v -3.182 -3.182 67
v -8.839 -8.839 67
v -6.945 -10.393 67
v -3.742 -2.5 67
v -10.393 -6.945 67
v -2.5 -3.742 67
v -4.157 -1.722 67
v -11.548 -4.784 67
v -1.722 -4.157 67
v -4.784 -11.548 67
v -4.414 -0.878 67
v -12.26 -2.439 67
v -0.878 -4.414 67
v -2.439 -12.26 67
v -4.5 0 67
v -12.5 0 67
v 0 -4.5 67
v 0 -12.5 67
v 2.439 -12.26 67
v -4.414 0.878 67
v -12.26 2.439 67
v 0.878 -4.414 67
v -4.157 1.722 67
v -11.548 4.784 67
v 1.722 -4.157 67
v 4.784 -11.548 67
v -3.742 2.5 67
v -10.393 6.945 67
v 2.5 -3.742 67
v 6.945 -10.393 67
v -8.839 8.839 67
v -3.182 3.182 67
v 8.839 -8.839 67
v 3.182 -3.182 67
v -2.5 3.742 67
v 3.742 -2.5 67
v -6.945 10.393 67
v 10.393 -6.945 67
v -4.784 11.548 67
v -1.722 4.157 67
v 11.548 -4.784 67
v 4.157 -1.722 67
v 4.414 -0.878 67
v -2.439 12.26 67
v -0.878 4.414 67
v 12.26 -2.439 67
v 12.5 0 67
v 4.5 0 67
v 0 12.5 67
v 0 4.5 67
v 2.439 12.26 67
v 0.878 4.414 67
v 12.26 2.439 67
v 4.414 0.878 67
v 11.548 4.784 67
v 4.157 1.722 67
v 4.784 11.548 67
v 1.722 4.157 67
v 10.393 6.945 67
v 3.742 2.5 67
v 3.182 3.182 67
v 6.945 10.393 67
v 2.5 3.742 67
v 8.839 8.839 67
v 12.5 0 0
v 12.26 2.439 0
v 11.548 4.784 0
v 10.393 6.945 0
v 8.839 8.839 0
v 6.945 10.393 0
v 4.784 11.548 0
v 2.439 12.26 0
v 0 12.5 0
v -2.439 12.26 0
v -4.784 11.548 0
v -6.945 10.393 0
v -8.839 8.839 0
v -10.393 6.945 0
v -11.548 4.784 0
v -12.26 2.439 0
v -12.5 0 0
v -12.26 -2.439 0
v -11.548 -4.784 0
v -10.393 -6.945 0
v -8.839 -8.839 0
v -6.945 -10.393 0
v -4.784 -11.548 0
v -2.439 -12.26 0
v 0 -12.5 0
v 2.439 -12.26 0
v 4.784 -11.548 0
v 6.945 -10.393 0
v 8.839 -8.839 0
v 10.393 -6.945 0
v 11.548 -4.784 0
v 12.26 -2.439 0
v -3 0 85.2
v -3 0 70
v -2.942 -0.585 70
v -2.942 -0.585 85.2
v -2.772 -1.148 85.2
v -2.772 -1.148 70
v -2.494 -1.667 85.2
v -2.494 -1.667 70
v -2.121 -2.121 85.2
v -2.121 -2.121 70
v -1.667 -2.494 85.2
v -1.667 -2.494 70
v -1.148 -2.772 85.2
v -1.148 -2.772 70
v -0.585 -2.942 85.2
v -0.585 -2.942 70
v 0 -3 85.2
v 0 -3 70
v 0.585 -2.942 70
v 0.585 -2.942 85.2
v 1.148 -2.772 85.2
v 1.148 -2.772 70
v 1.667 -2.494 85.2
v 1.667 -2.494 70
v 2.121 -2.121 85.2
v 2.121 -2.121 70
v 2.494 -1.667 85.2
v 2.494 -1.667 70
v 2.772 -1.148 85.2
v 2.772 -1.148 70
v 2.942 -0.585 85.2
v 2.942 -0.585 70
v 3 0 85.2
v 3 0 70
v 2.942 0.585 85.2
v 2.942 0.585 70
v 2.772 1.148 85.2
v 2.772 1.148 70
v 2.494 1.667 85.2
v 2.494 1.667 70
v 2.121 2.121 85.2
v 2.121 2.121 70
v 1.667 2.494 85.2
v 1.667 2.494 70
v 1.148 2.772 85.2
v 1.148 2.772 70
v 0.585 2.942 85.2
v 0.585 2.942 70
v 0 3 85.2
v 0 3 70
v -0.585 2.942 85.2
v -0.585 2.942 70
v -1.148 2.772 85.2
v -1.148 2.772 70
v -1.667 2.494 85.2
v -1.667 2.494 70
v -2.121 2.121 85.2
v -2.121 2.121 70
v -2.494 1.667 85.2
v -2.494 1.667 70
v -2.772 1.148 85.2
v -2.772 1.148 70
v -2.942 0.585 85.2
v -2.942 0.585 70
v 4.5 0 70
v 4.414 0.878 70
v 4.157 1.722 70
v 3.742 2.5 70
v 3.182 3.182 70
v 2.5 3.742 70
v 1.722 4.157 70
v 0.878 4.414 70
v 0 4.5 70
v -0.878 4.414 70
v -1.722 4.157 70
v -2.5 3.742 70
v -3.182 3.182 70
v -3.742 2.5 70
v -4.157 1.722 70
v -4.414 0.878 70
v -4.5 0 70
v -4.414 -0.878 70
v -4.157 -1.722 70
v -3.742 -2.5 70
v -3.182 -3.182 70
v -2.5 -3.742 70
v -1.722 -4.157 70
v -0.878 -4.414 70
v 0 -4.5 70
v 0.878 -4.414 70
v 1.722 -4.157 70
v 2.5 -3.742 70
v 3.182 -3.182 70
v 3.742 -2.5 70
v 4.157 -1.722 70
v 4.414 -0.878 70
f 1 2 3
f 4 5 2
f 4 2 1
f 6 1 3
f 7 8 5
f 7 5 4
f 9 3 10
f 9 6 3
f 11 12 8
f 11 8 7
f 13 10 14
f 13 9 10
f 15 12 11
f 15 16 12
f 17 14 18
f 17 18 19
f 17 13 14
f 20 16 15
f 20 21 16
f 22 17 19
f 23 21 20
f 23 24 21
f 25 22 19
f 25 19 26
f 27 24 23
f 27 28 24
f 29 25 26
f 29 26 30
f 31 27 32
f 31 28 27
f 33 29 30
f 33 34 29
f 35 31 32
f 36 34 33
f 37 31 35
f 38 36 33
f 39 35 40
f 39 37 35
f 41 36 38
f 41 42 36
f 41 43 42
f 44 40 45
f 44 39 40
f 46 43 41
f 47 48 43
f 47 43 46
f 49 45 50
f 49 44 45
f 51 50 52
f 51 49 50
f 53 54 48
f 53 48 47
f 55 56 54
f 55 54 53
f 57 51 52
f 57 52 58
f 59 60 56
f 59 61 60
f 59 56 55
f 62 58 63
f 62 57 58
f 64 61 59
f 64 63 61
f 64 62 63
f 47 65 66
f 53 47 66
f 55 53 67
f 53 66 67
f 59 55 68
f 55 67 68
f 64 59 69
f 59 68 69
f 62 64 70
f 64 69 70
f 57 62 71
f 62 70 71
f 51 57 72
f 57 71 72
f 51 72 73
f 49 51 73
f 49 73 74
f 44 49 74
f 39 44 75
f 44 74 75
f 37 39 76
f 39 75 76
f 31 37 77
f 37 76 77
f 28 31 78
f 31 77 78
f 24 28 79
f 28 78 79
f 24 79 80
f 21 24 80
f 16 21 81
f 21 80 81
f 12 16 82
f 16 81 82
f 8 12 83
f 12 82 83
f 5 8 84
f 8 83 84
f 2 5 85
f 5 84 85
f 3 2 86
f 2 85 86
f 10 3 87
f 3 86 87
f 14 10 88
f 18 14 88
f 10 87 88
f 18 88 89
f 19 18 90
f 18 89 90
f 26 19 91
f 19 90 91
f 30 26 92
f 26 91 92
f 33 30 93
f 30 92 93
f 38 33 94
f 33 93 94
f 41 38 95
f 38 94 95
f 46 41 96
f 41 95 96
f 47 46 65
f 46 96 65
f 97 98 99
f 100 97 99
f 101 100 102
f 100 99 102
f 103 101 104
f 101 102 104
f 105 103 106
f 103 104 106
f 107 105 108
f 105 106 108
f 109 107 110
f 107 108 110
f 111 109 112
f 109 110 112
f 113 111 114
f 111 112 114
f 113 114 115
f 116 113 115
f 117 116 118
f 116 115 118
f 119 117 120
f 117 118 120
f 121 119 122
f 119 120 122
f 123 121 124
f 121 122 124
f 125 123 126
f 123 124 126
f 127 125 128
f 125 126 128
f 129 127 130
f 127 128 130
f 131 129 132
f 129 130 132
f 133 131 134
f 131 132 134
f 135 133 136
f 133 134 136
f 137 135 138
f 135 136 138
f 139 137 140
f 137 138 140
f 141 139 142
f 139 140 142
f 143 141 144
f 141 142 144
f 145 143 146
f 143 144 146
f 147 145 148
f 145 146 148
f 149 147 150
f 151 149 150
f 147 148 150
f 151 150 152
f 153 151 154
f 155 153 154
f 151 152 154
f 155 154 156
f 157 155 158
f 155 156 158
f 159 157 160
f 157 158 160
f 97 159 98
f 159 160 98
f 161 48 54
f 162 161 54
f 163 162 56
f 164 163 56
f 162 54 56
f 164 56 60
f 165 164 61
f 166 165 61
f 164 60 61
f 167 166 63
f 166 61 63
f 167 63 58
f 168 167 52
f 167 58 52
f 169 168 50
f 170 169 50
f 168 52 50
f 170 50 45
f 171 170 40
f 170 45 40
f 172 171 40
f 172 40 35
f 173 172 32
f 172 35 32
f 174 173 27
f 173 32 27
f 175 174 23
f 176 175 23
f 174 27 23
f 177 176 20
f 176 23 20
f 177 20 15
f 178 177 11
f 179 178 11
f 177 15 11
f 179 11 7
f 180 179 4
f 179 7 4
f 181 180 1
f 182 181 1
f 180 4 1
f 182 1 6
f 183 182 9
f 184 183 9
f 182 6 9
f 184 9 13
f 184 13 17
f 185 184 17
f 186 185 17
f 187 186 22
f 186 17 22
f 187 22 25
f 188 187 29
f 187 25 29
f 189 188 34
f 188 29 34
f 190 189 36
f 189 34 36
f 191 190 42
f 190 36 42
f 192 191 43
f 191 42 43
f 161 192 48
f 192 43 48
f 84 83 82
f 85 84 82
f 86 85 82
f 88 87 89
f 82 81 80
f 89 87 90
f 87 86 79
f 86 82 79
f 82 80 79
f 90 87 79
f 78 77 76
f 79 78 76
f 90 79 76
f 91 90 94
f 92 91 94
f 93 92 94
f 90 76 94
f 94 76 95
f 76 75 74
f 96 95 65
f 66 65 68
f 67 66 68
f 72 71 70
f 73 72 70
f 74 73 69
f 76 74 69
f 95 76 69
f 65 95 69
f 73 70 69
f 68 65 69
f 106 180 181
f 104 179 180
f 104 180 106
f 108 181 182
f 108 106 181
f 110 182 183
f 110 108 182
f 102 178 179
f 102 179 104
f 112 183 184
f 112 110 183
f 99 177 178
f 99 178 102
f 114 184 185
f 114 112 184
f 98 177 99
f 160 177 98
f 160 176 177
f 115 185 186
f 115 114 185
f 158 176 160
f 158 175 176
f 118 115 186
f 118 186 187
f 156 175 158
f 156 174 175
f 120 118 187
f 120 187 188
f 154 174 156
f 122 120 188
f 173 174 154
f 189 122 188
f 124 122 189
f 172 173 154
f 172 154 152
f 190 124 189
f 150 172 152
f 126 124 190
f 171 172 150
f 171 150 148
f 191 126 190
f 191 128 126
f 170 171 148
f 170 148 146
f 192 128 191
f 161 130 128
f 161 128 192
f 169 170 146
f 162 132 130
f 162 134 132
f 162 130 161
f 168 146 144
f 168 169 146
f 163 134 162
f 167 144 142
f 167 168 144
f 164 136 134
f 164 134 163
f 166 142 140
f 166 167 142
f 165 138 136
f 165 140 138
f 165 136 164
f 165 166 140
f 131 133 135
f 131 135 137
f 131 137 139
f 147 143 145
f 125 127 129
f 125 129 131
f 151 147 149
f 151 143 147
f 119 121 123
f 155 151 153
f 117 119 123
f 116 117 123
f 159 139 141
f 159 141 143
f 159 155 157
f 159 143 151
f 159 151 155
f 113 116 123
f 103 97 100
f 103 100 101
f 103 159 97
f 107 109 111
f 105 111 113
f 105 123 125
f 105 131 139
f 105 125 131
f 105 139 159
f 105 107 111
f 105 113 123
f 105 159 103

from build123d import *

# Parameters (mm, degrees)
SKETCH1_R           = 12.5
BOSS_EXTRUDE1_DEPTH = 67
SKETCH2_R           = 4.5
BOSS_EXTRUDE3_DEPTH = 3
SKETCH3_R           = 3
BOSS_EXTRUDE4_DEPTH = 15.2


with BuildPart() as part:
    # Sketch1 → Boss-Extrude1 (new body)
    with BuildSketch(Plane.XY):
        Circle(SKETCH1_R)
    extrude(amount=BOSS_EXTRUDE1_DEPTH)

    # Sketch2 → Boss-Extrude3 (add)
    with BuildSketch(Plane.XY.offset(67)):
        Circle(SKETCH2_R)
    extrude(amount=BOSS_EXTRUDE3_DEPTH)

    # Sketch3 → Boss-Extrude4 (add)
    with BuildSketch(Plane.XY.offset(70)):
        with Locations(Location((0, 0, 0), (0, 0, 180))):
            Circle(SKETCH3_R)
    extrude(amount=BOSS_EXTRUDE4_DEPTH)


solid = part.part
